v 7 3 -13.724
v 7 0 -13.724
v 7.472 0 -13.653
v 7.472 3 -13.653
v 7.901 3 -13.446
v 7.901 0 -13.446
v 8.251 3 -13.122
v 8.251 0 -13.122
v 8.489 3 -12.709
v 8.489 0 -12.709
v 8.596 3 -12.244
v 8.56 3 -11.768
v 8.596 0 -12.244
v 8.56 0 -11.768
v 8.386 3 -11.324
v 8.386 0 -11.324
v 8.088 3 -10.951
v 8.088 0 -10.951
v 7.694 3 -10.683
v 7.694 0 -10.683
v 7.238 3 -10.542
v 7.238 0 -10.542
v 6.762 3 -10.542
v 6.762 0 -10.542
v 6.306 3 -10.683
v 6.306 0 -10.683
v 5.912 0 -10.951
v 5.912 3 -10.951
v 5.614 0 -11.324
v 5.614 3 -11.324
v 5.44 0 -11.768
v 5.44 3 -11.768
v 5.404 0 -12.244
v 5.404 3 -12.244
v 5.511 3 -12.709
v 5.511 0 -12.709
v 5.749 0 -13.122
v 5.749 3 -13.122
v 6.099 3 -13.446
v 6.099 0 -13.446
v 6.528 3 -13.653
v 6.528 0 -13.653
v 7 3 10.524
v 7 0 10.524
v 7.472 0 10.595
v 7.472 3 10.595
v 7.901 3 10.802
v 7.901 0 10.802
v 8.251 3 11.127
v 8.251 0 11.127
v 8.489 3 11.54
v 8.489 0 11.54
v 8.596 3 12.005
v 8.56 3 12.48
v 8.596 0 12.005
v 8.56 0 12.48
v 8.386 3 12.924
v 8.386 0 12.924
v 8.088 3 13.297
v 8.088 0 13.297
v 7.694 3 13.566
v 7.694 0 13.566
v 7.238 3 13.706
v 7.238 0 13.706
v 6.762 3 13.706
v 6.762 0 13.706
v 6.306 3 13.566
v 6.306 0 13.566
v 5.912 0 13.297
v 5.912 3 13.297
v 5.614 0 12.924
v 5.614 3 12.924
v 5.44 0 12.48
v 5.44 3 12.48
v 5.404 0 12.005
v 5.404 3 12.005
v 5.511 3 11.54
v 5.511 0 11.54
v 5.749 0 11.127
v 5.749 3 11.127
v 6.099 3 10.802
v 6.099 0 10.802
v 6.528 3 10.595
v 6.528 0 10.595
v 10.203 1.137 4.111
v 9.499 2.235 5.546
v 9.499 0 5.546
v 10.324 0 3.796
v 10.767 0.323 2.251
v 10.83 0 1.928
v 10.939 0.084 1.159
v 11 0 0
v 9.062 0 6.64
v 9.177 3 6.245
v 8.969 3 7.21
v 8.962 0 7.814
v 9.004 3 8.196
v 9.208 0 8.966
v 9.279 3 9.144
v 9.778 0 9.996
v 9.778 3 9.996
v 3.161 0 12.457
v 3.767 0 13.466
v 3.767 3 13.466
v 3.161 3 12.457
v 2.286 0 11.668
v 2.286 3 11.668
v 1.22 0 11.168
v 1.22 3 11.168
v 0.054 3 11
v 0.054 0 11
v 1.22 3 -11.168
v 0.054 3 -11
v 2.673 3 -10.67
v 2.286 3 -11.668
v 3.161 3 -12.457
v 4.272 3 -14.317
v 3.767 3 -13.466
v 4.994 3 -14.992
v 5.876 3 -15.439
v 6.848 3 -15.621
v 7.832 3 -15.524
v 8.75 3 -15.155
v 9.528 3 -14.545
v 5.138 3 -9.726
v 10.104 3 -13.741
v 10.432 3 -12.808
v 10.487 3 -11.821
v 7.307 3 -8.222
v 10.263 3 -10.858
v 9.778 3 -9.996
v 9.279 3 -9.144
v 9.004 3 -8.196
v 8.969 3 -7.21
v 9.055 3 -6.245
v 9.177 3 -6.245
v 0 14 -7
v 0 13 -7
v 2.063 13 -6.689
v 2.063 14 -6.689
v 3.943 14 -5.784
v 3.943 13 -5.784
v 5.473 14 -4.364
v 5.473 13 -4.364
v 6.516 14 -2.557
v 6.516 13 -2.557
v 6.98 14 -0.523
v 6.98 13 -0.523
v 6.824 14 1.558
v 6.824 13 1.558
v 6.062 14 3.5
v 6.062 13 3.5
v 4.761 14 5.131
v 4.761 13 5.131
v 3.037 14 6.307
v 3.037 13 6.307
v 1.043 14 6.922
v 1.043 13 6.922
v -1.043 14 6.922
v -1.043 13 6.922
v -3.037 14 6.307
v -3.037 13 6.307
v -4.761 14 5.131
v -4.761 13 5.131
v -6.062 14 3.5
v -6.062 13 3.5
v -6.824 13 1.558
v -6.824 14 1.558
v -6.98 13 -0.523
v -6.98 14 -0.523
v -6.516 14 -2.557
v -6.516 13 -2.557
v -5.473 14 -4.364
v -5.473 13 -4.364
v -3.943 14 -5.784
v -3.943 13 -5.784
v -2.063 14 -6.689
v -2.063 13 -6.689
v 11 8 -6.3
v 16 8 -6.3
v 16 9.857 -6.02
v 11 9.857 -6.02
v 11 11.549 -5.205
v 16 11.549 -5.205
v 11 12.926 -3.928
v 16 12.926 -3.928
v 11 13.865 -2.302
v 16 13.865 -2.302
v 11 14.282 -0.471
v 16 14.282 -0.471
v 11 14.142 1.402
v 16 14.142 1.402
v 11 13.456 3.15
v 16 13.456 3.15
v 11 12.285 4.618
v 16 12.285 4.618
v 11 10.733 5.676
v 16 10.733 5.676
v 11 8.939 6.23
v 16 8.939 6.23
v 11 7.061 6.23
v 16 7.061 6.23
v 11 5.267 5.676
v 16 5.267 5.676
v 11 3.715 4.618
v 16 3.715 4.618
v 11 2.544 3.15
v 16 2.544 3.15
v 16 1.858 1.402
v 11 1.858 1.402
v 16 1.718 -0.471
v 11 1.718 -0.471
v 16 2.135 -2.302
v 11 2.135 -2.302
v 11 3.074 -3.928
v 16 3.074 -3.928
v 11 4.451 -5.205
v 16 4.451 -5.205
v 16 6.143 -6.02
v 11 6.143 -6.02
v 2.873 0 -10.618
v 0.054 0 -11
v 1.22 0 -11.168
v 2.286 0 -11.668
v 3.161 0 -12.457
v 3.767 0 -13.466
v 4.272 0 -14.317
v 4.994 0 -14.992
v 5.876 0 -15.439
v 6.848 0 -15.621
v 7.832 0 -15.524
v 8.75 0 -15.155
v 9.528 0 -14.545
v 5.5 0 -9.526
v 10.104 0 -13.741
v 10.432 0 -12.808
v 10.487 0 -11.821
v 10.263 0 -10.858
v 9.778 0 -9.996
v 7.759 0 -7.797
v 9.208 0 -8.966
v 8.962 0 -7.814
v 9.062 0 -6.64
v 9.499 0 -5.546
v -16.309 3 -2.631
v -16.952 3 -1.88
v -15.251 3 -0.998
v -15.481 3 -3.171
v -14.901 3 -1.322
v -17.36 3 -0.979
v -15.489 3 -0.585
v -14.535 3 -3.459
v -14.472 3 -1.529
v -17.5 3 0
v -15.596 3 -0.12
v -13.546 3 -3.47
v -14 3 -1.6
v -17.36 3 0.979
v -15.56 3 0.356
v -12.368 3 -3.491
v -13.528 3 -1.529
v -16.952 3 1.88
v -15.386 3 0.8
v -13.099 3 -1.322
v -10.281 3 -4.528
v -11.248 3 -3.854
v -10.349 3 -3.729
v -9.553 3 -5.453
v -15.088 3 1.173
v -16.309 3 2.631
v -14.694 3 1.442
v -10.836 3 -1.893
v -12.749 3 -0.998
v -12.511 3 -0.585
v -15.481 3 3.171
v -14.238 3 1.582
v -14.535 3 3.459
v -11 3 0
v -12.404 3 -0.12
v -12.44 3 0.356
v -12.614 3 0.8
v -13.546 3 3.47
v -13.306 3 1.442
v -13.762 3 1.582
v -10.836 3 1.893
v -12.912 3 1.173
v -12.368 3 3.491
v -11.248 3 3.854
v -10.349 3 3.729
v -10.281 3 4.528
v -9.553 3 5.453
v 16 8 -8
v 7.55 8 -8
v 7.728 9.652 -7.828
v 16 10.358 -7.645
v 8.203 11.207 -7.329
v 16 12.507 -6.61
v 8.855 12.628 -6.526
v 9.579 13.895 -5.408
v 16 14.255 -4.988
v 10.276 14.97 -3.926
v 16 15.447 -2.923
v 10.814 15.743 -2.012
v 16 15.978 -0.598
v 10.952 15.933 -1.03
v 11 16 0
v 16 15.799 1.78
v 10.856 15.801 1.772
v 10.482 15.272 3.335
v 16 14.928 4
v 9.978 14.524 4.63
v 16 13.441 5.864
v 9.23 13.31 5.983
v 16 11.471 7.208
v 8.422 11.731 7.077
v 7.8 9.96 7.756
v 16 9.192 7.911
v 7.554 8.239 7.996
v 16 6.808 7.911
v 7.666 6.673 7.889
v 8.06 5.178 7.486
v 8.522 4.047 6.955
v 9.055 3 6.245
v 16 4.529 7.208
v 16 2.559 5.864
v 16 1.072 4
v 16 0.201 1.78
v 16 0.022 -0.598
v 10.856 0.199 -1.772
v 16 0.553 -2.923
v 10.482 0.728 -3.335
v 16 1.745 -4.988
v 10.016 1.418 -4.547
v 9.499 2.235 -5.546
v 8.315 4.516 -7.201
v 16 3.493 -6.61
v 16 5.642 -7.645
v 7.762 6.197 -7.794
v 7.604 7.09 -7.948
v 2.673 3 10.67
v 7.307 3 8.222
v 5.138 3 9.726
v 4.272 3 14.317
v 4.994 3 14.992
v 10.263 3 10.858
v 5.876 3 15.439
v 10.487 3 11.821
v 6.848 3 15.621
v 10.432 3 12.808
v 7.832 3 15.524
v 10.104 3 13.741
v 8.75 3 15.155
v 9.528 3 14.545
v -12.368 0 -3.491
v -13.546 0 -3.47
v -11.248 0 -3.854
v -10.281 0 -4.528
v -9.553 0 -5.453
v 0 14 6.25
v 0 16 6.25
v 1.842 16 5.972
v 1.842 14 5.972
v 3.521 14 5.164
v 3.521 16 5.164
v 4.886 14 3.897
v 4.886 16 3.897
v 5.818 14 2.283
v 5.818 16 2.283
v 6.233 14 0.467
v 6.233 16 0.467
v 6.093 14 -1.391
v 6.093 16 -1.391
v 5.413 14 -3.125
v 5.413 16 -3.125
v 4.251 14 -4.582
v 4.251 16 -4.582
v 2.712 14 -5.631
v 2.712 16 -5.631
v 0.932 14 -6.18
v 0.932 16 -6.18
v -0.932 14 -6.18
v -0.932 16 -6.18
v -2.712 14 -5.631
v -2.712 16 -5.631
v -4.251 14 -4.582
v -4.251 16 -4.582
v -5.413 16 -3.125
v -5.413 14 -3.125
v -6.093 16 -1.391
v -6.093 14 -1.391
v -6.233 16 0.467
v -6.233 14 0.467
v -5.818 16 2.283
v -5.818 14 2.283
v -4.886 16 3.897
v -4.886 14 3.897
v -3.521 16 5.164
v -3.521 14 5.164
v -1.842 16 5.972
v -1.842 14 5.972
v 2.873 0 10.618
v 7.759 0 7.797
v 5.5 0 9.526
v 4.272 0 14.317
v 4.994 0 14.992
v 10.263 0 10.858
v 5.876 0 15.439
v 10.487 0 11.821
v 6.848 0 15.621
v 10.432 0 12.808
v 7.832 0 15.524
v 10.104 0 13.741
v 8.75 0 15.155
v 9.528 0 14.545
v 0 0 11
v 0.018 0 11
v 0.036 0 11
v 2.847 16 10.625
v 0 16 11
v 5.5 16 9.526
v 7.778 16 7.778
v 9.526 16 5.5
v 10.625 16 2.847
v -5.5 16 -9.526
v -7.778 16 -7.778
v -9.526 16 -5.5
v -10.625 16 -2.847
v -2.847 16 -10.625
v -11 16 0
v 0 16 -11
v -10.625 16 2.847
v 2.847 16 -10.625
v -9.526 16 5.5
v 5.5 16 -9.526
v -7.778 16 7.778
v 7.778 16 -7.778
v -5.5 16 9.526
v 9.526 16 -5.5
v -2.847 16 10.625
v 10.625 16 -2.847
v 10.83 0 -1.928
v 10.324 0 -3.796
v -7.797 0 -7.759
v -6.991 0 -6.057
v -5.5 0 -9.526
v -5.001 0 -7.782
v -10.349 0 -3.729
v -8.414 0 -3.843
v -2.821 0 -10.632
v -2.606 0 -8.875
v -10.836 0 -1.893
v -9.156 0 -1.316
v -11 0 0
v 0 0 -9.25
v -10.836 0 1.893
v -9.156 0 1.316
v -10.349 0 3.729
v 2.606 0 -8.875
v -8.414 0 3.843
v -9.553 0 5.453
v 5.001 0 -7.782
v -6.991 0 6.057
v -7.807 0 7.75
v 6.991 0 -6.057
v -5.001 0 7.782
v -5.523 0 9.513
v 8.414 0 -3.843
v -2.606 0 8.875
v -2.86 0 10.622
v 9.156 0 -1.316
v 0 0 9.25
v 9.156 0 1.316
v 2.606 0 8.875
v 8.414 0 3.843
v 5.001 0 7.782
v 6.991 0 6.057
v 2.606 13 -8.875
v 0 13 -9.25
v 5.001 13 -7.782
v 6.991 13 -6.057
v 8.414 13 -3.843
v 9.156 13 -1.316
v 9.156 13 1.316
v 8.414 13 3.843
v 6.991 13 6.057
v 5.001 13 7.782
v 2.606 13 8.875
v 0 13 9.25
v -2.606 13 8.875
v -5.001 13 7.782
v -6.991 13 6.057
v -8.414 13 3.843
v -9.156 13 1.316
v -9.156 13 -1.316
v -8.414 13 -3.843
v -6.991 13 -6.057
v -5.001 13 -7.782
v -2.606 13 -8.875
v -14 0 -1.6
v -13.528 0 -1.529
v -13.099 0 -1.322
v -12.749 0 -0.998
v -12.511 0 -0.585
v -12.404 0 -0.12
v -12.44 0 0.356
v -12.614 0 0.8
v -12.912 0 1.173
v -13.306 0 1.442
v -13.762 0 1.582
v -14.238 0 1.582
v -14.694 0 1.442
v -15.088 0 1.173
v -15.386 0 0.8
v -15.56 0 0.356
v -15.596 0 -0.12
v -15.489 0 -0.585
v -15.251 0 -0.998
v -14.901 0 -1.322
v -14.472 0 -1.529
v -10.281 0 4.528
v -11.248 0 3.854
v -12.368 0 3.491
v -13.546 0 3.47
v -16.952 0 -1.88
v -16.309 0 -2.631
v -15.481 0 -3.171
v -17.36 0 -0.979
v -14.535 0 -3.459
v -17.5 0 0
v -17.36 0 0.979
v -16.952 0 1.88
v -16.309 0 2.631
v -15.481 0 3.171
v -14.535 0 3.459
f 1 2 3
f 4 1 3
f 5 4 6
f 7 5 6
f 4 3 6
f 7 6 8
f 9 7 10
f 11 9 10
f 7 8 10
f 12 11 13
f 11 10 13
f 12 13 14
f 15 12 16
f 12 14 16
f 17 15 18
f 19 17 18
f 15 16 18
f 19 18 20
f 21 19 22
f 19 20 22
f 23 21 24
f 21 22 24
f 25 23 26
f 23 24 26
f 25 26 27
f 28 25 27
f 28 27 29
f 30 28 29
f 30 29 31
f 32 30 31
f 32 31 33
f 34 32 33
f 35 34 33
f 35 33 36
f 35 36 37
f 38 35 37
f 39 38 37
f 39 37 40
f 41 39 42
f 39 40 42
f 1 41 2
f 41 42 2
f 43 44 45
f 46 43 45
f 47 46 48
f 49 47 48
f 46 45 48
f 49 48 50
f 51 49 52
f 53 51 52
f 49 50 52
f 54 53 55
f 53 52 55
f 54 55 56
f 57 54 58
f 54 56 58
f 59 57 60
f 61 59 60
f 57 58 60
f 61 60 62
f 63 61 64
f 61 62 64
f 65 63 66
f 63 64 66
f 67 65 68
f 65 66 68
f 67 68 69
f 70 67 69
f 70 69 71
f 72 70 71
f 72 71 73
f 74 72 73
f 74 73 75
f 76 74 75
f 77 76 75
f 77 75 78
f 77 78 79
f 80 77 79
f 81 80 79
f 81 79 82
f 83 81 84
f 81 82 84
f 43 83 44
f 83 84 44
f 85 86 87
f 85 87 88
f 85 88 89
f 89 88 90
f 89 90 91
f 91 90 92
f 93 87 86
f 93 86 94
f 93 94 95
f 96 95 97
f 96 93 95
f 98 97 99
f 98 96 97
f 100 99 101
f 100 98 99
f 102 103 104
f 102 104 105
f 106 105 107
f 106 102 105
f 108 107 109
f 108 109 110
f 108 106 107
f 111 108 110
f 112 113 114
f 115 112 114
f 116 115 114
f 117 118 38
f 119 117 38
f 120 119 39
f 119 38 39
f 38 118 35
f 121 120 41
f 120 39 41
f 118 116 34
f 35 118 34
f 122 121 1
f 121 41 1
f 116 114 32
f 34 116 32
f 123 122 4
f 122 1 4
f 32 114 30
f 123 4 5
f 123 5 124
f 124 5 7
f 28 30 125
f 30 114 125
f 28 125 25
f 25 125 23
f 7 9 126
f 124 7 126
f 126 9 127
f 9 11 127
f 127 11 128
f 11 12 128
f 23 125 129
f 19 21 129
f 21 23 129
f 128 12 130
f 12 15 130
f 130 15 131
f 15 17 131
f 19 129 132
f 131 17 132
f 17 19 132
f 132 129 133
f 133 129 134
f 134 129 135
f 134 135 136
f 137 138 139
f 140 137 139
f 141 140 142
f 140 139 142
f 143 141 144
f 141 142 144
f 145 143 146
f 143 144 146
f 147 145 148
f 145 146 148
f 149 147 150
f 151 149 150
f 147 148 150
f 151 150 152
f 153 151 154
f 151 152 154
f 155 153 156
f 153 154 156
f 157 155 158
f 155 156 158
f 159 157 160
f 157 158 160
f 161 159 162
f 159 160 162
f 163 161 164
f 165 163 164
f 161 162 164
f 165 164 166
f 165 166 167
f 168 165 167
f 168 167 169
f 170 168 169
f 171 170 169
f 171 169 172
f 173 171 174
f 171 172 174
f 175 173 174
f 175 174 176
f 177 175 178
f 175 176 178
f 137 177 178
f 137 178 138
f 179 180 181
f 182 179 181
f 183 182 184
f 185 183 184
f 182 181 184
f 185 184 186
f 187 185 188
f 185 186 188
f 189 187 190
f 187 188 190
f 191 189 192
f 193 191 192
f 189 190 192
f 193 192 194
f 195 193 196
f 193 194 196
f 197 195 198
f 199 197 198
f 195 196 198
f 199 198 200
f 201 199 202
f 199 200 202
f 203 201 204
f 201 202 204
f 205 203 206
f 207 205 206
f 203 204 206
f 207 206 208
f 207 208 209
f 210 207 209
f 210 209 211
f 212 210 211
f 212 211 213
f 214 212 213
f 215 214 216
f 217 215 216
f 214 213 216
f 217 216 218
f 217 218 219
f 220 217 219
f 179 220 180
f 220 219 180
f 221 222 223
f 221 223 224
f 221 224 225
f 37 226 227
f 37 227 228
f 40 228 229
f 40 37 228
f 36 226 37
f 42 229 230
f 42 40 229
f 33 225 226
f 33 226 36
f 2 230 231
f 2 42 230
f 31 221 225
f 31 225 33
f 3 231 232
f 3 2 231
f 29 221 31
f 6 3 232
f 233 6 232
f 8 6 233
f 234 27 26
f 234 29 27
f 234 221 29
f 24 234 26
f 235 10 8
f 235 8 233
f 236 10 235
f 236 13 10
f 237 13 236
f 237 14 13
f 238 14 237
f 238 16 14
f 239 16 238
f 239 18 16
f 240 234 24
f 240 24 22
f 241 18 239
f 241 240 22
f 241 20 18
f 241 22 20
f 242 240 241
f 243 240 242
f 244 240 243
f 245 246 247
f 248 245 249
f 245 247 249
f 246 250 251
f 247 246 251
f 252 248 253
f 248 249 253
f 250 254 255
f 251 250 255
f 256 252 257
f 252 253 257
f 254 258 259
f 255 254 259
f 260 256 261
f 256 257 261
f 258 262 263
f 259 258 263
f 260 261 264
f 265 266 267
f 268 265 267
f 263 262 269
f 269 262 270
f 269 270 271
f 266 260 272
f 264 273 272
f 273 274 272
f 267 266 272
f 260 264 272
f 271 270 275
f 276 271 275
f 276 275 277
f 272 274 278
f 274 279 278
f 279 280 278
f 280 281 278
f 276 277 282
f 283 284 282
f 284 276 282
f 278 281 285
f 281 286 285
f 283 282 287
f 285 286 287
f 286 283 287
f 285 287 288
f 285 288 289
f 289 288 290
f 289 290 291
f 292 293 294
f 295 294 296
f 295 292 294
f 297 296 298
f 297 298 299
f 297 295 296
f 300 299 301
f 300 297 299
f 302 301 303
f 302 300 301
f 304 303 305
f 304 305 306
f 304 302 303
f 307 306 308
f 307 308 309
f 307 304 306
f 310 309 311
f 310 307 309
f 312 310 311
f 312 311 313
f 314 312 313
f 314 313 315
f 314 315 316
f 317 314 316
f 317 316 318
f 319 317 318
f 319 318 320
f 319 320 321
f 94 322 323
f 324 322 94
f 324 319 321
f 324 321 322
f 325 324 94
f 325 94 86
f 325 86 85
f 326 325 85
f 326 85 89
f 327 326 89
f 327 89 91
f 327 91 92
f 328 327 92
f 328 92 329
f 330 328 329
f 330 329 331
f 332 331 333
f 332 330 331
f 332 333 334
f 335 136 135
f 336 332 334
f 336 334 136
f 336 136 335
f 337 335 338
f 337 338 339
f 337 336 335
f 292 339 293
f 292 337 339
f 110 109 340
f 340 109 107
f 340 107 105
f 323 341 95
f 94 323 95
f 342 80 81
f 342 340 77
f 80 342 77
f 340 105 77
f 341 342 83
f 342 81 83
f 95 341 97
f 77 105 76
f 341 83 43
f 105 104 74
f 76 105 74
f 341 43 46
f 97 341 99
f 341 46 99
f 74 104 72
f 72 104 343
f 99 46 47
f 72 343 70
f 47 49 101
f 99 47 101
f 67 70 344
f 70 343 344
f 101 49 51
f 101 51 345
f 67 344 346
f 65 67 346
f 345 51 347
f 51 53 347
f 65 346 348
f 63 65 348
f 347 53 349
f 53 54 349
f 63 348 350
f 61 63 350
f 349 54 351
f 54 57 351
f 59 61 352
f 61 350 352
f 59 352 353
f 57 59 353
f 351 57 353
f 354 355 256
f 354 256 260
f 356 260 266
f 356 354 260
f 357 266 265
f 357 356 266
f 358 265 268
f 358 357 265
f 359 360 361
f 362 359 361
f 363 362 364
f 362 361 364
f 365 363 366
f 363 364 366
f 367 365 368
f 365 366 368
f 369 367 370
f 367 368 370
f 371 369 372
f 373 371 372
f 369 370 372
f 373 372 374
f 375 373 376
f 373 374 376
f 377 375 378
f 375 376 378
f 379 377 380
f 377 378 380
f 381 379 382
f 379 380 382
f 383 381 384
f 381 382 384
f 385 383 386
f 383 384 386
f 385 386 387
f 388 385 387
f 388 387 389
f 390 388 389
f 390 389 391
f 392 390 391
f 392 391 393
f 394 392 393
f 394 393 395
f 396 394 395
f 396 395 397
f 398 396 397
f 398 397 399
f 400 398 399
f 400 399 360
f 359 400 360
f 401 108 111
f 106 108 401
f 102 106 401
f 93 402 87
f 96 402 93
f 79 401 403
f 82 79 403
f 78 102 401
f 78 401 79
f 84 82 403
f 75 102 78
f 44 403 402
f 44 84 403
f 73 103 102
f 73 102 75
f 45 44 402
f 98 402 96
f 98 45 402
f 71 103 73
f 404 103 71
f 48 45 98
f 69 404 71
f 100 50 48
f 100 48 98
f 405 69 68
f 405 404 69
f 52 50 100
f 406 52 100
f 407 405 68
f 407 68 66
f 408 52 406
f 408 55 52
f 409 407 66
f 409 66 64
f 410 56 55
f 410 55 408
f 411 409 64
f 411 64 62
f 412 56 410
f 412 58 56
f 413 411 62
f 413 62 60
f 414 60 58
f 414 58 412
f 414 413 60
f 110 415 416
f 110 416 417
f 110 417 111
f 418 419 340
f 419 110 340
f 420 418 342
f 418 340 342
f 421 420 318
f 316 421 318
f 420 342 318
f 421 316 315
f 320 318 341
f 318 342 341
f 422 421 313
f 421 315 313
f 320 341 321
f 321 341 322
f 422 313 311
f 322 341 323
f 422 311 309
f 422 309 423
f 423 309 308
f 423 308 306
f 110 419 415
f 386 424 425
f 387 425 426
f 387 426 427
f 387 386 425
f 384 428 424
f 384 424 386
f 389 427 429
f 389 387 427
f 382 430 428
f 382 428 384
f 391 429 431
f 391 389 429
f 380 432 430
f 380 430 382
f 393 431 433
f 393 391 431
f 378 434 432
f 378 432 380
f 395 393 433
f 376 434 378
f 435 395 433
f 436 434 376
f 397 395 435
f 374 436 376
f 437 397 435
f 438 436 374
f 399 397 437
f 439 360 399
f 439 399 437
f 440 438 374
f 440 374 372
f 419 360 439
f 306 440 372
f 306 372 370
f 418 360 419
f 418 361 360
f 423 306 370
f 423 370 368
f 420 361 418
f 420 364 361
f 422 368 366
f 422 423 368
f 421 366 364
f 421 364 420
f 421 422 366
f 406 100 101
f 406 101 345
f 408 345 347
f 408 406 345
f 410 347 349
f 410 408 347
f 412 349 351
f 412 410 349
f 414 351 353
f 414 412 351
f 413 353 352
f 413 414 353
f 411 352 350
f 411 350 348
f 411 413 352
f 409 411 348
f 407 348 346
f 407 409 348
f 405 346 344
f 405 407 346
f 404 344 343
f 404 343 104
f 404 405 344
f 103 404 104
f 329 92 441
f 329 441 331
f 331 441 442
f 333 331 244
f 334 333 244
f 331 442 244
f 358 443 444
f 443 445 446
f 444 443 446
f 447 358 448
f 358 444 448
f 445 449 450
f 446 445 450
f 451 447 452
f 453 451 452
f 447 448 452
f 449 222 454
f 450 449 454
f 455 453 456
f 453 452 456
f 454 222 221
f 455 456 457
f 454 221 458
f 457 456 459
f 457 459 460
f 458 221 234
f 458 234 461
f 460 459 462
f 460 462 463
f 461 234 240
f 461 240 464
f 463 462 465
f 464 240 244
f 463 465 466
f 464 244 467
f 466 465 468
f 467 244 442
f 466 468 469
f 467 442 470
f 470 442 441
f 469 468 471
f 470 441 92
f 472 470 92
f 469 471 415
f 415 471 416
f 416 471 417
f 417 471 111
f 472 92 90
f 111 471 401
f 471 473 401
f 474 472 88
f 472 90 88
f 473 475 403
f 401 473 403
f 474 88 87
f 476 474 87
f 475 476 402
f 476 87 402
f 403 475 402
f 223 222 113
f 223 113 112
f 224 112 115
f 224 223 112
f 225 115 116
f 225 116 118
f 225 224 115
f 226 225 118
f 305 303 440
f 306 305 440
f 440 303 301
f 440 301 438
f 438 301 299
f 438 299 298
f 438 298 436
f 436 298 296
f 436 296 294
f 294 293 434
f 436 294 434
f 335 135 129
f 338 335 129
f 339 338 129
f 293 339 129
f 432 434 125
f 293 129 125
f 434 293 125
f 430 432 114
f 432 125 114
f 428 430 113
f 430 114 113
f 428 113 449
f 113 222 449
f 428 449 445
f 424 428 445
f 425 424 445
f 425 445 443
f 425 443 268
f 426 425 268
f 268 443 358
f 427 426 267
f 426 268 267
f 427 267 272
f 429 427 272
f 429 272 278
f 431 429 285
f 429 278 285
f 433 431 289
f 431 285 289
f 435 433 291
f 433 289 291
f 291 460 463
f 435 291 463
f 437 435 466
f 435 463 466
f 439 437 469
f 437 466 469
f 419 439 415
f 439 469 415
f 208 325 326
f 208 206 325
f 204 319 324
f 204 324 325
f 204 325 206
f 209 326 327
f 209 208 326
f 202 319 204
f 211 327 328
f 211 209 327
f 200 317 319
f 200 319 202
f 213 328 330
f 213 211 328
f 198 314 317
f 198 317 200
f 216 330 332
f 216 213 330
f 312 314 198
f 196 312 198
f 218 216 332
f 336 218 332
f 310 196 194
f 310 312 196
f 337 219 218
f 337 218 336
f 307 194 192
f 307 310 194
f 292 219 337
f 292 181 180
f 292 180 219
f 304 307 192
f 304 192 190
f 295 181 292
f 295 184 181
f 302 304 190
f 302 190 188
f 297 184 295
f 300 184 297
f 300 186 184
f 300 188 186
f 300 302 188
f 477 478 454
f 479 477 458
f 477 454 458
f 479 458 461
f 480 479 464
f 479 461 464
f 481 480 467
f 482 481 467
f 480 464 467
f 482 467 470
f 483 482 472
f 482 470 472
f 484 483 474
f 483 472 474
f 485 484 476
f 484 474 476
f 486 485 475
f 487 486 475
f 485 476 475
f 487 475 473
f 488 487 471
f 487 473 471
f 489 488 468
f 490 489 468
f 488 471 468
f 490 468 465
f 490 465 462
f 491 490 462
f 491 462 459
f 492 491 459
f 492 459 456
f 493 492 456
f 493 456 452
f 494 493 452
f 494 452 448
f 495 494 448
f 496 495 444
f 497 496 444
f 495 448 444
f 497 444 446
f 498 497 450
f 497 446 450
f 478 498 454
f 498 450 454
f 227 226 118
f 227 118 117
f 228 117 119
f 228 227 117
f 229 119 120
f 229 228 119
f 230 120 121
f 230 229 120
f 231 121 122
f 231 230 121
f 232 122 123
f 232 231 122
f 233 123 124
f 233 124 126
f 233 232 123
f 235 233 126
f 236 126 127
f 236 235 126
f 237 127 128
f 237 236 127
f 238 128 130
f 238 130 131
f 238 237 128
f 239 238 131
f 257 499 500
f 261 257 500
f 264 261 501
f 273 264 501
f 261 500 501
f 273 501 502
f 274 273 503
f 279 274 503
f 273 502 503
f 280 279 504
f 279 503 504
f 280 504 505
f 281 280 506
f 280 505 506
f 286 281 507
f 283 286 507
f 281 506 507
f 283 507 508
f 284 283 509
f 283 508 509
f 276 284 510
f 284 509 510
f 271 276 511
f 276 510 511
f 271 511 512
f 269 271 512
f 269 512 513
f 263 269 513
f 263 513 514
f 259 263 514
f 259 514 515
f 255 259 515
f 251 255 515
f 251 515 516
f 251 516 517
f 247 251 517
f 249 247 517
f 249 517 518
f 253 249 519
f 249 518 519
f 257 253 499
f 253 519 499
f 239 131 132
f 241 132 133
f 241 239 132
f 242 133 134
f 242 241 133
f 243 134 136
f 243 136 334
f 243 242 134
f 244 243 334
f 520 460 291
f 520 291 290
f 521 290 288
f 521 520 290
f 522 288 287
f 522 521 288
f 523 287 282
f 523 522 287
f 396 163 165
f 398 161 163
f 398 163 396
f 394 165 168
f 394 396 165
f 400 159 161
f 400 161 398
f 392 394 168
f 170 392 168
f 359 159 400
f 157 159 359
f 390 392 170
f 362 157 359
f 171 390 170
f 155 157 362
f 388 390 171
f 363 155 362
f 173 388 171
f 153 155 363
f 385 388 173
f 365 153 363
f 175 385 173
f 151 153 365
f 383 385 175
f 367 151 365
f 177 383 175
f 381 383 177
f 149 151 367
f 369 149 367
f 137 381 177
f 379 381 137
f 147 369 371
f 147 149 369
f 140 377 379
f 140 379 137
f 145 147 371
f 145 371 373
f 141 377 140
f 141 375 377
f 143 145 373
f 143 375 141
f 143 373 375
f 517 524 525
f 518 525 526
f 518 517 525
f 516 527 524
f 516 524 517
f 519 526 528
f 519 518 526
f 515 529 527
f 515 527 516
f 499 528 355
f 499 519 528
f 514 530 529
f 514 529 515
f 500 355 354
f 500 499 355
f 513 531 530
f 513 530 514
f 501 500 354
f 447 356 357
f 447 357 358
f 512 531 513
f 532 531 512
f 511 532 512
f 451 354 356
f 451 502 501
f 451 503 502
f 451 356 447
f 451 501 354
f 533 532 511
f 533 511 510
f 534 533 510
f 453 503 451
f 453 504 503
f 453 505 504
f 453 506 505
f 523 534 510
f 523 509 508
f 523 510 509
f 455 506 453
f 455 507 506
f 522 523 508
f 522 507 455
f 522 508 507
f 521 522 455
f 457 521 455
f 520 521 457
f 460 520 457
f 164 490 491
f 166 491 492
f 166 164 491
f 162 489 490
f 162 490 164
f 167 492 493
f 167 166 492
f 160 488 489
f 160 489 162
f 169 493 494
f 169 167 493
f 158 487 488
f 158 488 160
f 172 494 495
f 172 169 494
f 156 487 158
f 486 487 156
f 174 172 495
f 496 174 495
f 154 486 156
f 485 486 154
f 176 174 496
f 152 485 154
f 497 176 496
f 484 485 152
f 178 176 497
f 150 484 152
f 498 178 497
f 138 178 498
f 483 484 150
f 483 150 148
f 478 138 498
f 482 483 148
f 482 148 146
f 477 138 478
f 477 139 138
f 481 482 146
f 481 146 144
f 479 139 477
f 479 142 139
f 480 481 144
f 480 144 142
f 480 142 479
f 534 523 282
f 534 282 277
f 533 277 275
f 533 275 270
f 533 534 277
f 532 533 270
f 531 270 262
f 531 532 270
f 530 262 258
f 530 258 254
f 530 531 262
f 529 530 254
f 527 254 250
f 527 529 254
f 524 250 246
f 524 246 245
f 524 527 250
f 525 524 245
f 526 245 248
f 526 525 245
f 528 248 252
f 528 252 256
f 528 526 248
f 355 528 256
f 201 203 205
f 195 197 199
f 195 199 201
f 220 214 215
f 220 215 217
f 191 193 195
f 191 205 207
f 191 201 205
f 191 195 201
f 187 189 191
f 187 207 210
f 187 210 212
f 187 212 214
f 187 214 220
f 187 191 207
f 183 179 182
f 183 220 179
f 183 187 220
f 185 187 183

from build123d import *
from build123d.topology import SkipClean

# Parameters (mm, degrees)
SKETCH_1_R          = 11
EXTRUDE_1_DEPTH     = 16
CUT_EXTRUDE_1_REACH = 24.316
SKETCH_2_R          = 6.25
SKETCH_3_R          = 9.25
CUT_EXTRUDE_2_DEPTH = 13
EXTRUDE_2_REACH     = 35.257
SKETCH_4_R          = 8
SKETCH_5_R          = 6.3
CUT_EXTRUDE_3_DEPTH = 5
SKETCH_6_R          = 1.6
EXTRUDE_3_DEPTH     = 3
SKETCH_7_R          = 7
CUT_EXTRUDE_4_DEPTH = 1


with BuildPart() as part:
    # 草图1 → 凸台-拉伸1 (new body)
    with BuildSketch(Plane(origin=(0, 0, 0), x_dir=(1, 0, 0), z_dir=(0, 1, 0))):
        with Locations(Location((0, 0, 0), (0, 0, 270))):
            Circle(SKETCH_1_R)
    extrude(amount=EXTRUDE_1_DEPTH)

    # 草图2 → 切除-拉伸1 (cut, up to next)
    with BuildSketch(Plane(origin=(0, 16, 0), x_dir=(1, 0, 0), z_dir=(0, 1, 0)), mode=Mode.PRIVATE) as cut_extrude_1_sk1:
        with Locations(Location((0, 0, 0), (0, 0, 270))):
            Circle(SKETCH_2_R)
    cut_extrude_1_tool1 = extrude(cut_extrude_1_sk1.sketch, amount=-CUT_EXTRUDE_1_REACH, mode=Mode.PRIVATE) & part.part
    add(cut_extrude_1_tool1.solids().sort_by_distance((0, 16, 0))[0], mode=Mode.SUBTRACT)

    # 草图3 → 切除-拉伸2 (cut)
    with BuildSketch(Plane.XZ):
        with Locations(Location((0, 0, 0), (0, 0, 270))):
            Circle(SKETCH_3_R)
    extrude(amount=-CUT_EXTRUDE_2_DEPTH, mode=Mode.SUBTRACT)

    # 草图4 → 凸台-拉伸2 (add, up to next)
    with BuildSketch(Plane(origin=(16, 0, 0), x_dir=(0, 0, -1), z_dir=(1, 0, 0)), mode=Mode.PRIVATE) as extrude_2_sk1:
        with Locations((0, 8)):
            Circle(SKETCH_4_R)
    extrude_2_tool1 = extrude(extrude_2_sk1.sketch, amount=-EXTRUDE_2_REACH, mode=Mode.PRIVATE) - part.part
    add(extrude_2_tool1.solids().sort_by_distance((16, 8, 0))[0])

    # 草图5 → 切除-拉伸3 (cut)
    with SkipClean():  # the faces are left unmerged after this step: merging them gives an invalid solid
        with BuildSketch(Plane(origin=(16, 0, 0), x_dir=(0, 0, -1), z_dir=(1, 0, 0))):
            with Locations((0, 8)):
                Circle(SKETCH_5_R)
        extrude(amount=-CUT_EXTRUDE_3_DEPTH, mode=Mode.SUBTRACT)

    # 草图6 → 凸台-拉伸3 (add)
    # profile 1 of 3: a face of its own
    with SkipClean():  # the faces are left unmerged after this step: merging them gives an invalid solid
        with BuildSketch(Plane.XZ):
            with BuildLine():
                ThreePointArc((-11, 0), (-10.632091471, 2.821104562), (-9.55297619, 5.453498501))
                ThreePointArc((-9.55297619, 5.453498501), (-11.247511613, 3.854105973), (-13.545833333, 3.470408137))
                ThreePointArc((-13.545833333, 3.470408137), (-17.5, 0), (-13.545833333, -3.470408137))
                ThreePointArc((-13.545833333, -3.470408137), (-11.247511613, -3.854105973), (-9.55297619, -5.453498501))
                ThreePointArc((-9.55297619, -5.453498501), (-10.632091471, -2.821104562), (-11, 0))
            make_face()
            with Locations(Location((-14, 0, 0), (0, 0, 270))):
                Circle(SKETCH_6_R, mode=Mode.SUBTRACT)
        # profile 2 of 3: a face of its own
        with BuildSketch(Plane.XZ):
            with BuildLine():
                ThreePointArc((9.778378275, 9.995831713), (8.75, 15.155444566), (3.767455058, 13.466239851))
                ThreePointArc((3.767455058, 13.466239851), (2.286002125, 11.667683773), (0.053619854, 10.999869313))
                ThreePointArc((0.053619854, 10.999869313), (5.5, 9.526279442), (9.499356337, 5.546370812))
                ThreePointArc((9.499356337, 5.546370812), (8.961509488, 7.8135778), (9.778378275, 9.995831713))
            make_face()
            with Locations(Location((7, 12.124355653, 0), (0, 0, 270))):
                Circle(SKETCH_6_R, mode=Mode.SUBTRACT)
        # profile 3 of 3: a face of its own
        with BuildSketch(Plane.XZ):
            with BuildLine():
                ThreePointArc((3.767455058, -13.466239851), (8.75, -15.155444566), (9.778378275, -9.995831713))
                ThreePointArc((9.778378275, -9.995831713), (8.961509488, -7.8135778), (9.499356337, -5.546370812))
                ThreePointArc((9.499356337, -5.546370812), (5.5, -9.526279442), (0.053619854, -10.999869313))
                ThreePointArc((0.053619854, -10.999869313), (2.286002125, -11.667683773), (3.767455058, -13.466239851))
            make_face()
            with Locations(Location((7, -12.124355653, 0), (0, 0, 270))):
                Circle(SKETCH_6_R, mode=Mode.SUBTRACT)
        extrude(amount=-EXTRUDE_3_DEPTH)

    # 草图7 → 切除-拉伸4 (cut)
    with SkipClean():  # the faces are left unmerged after this step: merging them gives an invalid solid
        with BuildSketch(Plane.XZ.offset(-13)):
            with Locations(Location((0, 0, 0), (0, 0, 270))):
                Circle(SKETCH_7_R)
        extrude(amount=-CUT_EXTRUDE_4_DEPTH, mode=Mode.SUBTRACT)


solid = part.part
